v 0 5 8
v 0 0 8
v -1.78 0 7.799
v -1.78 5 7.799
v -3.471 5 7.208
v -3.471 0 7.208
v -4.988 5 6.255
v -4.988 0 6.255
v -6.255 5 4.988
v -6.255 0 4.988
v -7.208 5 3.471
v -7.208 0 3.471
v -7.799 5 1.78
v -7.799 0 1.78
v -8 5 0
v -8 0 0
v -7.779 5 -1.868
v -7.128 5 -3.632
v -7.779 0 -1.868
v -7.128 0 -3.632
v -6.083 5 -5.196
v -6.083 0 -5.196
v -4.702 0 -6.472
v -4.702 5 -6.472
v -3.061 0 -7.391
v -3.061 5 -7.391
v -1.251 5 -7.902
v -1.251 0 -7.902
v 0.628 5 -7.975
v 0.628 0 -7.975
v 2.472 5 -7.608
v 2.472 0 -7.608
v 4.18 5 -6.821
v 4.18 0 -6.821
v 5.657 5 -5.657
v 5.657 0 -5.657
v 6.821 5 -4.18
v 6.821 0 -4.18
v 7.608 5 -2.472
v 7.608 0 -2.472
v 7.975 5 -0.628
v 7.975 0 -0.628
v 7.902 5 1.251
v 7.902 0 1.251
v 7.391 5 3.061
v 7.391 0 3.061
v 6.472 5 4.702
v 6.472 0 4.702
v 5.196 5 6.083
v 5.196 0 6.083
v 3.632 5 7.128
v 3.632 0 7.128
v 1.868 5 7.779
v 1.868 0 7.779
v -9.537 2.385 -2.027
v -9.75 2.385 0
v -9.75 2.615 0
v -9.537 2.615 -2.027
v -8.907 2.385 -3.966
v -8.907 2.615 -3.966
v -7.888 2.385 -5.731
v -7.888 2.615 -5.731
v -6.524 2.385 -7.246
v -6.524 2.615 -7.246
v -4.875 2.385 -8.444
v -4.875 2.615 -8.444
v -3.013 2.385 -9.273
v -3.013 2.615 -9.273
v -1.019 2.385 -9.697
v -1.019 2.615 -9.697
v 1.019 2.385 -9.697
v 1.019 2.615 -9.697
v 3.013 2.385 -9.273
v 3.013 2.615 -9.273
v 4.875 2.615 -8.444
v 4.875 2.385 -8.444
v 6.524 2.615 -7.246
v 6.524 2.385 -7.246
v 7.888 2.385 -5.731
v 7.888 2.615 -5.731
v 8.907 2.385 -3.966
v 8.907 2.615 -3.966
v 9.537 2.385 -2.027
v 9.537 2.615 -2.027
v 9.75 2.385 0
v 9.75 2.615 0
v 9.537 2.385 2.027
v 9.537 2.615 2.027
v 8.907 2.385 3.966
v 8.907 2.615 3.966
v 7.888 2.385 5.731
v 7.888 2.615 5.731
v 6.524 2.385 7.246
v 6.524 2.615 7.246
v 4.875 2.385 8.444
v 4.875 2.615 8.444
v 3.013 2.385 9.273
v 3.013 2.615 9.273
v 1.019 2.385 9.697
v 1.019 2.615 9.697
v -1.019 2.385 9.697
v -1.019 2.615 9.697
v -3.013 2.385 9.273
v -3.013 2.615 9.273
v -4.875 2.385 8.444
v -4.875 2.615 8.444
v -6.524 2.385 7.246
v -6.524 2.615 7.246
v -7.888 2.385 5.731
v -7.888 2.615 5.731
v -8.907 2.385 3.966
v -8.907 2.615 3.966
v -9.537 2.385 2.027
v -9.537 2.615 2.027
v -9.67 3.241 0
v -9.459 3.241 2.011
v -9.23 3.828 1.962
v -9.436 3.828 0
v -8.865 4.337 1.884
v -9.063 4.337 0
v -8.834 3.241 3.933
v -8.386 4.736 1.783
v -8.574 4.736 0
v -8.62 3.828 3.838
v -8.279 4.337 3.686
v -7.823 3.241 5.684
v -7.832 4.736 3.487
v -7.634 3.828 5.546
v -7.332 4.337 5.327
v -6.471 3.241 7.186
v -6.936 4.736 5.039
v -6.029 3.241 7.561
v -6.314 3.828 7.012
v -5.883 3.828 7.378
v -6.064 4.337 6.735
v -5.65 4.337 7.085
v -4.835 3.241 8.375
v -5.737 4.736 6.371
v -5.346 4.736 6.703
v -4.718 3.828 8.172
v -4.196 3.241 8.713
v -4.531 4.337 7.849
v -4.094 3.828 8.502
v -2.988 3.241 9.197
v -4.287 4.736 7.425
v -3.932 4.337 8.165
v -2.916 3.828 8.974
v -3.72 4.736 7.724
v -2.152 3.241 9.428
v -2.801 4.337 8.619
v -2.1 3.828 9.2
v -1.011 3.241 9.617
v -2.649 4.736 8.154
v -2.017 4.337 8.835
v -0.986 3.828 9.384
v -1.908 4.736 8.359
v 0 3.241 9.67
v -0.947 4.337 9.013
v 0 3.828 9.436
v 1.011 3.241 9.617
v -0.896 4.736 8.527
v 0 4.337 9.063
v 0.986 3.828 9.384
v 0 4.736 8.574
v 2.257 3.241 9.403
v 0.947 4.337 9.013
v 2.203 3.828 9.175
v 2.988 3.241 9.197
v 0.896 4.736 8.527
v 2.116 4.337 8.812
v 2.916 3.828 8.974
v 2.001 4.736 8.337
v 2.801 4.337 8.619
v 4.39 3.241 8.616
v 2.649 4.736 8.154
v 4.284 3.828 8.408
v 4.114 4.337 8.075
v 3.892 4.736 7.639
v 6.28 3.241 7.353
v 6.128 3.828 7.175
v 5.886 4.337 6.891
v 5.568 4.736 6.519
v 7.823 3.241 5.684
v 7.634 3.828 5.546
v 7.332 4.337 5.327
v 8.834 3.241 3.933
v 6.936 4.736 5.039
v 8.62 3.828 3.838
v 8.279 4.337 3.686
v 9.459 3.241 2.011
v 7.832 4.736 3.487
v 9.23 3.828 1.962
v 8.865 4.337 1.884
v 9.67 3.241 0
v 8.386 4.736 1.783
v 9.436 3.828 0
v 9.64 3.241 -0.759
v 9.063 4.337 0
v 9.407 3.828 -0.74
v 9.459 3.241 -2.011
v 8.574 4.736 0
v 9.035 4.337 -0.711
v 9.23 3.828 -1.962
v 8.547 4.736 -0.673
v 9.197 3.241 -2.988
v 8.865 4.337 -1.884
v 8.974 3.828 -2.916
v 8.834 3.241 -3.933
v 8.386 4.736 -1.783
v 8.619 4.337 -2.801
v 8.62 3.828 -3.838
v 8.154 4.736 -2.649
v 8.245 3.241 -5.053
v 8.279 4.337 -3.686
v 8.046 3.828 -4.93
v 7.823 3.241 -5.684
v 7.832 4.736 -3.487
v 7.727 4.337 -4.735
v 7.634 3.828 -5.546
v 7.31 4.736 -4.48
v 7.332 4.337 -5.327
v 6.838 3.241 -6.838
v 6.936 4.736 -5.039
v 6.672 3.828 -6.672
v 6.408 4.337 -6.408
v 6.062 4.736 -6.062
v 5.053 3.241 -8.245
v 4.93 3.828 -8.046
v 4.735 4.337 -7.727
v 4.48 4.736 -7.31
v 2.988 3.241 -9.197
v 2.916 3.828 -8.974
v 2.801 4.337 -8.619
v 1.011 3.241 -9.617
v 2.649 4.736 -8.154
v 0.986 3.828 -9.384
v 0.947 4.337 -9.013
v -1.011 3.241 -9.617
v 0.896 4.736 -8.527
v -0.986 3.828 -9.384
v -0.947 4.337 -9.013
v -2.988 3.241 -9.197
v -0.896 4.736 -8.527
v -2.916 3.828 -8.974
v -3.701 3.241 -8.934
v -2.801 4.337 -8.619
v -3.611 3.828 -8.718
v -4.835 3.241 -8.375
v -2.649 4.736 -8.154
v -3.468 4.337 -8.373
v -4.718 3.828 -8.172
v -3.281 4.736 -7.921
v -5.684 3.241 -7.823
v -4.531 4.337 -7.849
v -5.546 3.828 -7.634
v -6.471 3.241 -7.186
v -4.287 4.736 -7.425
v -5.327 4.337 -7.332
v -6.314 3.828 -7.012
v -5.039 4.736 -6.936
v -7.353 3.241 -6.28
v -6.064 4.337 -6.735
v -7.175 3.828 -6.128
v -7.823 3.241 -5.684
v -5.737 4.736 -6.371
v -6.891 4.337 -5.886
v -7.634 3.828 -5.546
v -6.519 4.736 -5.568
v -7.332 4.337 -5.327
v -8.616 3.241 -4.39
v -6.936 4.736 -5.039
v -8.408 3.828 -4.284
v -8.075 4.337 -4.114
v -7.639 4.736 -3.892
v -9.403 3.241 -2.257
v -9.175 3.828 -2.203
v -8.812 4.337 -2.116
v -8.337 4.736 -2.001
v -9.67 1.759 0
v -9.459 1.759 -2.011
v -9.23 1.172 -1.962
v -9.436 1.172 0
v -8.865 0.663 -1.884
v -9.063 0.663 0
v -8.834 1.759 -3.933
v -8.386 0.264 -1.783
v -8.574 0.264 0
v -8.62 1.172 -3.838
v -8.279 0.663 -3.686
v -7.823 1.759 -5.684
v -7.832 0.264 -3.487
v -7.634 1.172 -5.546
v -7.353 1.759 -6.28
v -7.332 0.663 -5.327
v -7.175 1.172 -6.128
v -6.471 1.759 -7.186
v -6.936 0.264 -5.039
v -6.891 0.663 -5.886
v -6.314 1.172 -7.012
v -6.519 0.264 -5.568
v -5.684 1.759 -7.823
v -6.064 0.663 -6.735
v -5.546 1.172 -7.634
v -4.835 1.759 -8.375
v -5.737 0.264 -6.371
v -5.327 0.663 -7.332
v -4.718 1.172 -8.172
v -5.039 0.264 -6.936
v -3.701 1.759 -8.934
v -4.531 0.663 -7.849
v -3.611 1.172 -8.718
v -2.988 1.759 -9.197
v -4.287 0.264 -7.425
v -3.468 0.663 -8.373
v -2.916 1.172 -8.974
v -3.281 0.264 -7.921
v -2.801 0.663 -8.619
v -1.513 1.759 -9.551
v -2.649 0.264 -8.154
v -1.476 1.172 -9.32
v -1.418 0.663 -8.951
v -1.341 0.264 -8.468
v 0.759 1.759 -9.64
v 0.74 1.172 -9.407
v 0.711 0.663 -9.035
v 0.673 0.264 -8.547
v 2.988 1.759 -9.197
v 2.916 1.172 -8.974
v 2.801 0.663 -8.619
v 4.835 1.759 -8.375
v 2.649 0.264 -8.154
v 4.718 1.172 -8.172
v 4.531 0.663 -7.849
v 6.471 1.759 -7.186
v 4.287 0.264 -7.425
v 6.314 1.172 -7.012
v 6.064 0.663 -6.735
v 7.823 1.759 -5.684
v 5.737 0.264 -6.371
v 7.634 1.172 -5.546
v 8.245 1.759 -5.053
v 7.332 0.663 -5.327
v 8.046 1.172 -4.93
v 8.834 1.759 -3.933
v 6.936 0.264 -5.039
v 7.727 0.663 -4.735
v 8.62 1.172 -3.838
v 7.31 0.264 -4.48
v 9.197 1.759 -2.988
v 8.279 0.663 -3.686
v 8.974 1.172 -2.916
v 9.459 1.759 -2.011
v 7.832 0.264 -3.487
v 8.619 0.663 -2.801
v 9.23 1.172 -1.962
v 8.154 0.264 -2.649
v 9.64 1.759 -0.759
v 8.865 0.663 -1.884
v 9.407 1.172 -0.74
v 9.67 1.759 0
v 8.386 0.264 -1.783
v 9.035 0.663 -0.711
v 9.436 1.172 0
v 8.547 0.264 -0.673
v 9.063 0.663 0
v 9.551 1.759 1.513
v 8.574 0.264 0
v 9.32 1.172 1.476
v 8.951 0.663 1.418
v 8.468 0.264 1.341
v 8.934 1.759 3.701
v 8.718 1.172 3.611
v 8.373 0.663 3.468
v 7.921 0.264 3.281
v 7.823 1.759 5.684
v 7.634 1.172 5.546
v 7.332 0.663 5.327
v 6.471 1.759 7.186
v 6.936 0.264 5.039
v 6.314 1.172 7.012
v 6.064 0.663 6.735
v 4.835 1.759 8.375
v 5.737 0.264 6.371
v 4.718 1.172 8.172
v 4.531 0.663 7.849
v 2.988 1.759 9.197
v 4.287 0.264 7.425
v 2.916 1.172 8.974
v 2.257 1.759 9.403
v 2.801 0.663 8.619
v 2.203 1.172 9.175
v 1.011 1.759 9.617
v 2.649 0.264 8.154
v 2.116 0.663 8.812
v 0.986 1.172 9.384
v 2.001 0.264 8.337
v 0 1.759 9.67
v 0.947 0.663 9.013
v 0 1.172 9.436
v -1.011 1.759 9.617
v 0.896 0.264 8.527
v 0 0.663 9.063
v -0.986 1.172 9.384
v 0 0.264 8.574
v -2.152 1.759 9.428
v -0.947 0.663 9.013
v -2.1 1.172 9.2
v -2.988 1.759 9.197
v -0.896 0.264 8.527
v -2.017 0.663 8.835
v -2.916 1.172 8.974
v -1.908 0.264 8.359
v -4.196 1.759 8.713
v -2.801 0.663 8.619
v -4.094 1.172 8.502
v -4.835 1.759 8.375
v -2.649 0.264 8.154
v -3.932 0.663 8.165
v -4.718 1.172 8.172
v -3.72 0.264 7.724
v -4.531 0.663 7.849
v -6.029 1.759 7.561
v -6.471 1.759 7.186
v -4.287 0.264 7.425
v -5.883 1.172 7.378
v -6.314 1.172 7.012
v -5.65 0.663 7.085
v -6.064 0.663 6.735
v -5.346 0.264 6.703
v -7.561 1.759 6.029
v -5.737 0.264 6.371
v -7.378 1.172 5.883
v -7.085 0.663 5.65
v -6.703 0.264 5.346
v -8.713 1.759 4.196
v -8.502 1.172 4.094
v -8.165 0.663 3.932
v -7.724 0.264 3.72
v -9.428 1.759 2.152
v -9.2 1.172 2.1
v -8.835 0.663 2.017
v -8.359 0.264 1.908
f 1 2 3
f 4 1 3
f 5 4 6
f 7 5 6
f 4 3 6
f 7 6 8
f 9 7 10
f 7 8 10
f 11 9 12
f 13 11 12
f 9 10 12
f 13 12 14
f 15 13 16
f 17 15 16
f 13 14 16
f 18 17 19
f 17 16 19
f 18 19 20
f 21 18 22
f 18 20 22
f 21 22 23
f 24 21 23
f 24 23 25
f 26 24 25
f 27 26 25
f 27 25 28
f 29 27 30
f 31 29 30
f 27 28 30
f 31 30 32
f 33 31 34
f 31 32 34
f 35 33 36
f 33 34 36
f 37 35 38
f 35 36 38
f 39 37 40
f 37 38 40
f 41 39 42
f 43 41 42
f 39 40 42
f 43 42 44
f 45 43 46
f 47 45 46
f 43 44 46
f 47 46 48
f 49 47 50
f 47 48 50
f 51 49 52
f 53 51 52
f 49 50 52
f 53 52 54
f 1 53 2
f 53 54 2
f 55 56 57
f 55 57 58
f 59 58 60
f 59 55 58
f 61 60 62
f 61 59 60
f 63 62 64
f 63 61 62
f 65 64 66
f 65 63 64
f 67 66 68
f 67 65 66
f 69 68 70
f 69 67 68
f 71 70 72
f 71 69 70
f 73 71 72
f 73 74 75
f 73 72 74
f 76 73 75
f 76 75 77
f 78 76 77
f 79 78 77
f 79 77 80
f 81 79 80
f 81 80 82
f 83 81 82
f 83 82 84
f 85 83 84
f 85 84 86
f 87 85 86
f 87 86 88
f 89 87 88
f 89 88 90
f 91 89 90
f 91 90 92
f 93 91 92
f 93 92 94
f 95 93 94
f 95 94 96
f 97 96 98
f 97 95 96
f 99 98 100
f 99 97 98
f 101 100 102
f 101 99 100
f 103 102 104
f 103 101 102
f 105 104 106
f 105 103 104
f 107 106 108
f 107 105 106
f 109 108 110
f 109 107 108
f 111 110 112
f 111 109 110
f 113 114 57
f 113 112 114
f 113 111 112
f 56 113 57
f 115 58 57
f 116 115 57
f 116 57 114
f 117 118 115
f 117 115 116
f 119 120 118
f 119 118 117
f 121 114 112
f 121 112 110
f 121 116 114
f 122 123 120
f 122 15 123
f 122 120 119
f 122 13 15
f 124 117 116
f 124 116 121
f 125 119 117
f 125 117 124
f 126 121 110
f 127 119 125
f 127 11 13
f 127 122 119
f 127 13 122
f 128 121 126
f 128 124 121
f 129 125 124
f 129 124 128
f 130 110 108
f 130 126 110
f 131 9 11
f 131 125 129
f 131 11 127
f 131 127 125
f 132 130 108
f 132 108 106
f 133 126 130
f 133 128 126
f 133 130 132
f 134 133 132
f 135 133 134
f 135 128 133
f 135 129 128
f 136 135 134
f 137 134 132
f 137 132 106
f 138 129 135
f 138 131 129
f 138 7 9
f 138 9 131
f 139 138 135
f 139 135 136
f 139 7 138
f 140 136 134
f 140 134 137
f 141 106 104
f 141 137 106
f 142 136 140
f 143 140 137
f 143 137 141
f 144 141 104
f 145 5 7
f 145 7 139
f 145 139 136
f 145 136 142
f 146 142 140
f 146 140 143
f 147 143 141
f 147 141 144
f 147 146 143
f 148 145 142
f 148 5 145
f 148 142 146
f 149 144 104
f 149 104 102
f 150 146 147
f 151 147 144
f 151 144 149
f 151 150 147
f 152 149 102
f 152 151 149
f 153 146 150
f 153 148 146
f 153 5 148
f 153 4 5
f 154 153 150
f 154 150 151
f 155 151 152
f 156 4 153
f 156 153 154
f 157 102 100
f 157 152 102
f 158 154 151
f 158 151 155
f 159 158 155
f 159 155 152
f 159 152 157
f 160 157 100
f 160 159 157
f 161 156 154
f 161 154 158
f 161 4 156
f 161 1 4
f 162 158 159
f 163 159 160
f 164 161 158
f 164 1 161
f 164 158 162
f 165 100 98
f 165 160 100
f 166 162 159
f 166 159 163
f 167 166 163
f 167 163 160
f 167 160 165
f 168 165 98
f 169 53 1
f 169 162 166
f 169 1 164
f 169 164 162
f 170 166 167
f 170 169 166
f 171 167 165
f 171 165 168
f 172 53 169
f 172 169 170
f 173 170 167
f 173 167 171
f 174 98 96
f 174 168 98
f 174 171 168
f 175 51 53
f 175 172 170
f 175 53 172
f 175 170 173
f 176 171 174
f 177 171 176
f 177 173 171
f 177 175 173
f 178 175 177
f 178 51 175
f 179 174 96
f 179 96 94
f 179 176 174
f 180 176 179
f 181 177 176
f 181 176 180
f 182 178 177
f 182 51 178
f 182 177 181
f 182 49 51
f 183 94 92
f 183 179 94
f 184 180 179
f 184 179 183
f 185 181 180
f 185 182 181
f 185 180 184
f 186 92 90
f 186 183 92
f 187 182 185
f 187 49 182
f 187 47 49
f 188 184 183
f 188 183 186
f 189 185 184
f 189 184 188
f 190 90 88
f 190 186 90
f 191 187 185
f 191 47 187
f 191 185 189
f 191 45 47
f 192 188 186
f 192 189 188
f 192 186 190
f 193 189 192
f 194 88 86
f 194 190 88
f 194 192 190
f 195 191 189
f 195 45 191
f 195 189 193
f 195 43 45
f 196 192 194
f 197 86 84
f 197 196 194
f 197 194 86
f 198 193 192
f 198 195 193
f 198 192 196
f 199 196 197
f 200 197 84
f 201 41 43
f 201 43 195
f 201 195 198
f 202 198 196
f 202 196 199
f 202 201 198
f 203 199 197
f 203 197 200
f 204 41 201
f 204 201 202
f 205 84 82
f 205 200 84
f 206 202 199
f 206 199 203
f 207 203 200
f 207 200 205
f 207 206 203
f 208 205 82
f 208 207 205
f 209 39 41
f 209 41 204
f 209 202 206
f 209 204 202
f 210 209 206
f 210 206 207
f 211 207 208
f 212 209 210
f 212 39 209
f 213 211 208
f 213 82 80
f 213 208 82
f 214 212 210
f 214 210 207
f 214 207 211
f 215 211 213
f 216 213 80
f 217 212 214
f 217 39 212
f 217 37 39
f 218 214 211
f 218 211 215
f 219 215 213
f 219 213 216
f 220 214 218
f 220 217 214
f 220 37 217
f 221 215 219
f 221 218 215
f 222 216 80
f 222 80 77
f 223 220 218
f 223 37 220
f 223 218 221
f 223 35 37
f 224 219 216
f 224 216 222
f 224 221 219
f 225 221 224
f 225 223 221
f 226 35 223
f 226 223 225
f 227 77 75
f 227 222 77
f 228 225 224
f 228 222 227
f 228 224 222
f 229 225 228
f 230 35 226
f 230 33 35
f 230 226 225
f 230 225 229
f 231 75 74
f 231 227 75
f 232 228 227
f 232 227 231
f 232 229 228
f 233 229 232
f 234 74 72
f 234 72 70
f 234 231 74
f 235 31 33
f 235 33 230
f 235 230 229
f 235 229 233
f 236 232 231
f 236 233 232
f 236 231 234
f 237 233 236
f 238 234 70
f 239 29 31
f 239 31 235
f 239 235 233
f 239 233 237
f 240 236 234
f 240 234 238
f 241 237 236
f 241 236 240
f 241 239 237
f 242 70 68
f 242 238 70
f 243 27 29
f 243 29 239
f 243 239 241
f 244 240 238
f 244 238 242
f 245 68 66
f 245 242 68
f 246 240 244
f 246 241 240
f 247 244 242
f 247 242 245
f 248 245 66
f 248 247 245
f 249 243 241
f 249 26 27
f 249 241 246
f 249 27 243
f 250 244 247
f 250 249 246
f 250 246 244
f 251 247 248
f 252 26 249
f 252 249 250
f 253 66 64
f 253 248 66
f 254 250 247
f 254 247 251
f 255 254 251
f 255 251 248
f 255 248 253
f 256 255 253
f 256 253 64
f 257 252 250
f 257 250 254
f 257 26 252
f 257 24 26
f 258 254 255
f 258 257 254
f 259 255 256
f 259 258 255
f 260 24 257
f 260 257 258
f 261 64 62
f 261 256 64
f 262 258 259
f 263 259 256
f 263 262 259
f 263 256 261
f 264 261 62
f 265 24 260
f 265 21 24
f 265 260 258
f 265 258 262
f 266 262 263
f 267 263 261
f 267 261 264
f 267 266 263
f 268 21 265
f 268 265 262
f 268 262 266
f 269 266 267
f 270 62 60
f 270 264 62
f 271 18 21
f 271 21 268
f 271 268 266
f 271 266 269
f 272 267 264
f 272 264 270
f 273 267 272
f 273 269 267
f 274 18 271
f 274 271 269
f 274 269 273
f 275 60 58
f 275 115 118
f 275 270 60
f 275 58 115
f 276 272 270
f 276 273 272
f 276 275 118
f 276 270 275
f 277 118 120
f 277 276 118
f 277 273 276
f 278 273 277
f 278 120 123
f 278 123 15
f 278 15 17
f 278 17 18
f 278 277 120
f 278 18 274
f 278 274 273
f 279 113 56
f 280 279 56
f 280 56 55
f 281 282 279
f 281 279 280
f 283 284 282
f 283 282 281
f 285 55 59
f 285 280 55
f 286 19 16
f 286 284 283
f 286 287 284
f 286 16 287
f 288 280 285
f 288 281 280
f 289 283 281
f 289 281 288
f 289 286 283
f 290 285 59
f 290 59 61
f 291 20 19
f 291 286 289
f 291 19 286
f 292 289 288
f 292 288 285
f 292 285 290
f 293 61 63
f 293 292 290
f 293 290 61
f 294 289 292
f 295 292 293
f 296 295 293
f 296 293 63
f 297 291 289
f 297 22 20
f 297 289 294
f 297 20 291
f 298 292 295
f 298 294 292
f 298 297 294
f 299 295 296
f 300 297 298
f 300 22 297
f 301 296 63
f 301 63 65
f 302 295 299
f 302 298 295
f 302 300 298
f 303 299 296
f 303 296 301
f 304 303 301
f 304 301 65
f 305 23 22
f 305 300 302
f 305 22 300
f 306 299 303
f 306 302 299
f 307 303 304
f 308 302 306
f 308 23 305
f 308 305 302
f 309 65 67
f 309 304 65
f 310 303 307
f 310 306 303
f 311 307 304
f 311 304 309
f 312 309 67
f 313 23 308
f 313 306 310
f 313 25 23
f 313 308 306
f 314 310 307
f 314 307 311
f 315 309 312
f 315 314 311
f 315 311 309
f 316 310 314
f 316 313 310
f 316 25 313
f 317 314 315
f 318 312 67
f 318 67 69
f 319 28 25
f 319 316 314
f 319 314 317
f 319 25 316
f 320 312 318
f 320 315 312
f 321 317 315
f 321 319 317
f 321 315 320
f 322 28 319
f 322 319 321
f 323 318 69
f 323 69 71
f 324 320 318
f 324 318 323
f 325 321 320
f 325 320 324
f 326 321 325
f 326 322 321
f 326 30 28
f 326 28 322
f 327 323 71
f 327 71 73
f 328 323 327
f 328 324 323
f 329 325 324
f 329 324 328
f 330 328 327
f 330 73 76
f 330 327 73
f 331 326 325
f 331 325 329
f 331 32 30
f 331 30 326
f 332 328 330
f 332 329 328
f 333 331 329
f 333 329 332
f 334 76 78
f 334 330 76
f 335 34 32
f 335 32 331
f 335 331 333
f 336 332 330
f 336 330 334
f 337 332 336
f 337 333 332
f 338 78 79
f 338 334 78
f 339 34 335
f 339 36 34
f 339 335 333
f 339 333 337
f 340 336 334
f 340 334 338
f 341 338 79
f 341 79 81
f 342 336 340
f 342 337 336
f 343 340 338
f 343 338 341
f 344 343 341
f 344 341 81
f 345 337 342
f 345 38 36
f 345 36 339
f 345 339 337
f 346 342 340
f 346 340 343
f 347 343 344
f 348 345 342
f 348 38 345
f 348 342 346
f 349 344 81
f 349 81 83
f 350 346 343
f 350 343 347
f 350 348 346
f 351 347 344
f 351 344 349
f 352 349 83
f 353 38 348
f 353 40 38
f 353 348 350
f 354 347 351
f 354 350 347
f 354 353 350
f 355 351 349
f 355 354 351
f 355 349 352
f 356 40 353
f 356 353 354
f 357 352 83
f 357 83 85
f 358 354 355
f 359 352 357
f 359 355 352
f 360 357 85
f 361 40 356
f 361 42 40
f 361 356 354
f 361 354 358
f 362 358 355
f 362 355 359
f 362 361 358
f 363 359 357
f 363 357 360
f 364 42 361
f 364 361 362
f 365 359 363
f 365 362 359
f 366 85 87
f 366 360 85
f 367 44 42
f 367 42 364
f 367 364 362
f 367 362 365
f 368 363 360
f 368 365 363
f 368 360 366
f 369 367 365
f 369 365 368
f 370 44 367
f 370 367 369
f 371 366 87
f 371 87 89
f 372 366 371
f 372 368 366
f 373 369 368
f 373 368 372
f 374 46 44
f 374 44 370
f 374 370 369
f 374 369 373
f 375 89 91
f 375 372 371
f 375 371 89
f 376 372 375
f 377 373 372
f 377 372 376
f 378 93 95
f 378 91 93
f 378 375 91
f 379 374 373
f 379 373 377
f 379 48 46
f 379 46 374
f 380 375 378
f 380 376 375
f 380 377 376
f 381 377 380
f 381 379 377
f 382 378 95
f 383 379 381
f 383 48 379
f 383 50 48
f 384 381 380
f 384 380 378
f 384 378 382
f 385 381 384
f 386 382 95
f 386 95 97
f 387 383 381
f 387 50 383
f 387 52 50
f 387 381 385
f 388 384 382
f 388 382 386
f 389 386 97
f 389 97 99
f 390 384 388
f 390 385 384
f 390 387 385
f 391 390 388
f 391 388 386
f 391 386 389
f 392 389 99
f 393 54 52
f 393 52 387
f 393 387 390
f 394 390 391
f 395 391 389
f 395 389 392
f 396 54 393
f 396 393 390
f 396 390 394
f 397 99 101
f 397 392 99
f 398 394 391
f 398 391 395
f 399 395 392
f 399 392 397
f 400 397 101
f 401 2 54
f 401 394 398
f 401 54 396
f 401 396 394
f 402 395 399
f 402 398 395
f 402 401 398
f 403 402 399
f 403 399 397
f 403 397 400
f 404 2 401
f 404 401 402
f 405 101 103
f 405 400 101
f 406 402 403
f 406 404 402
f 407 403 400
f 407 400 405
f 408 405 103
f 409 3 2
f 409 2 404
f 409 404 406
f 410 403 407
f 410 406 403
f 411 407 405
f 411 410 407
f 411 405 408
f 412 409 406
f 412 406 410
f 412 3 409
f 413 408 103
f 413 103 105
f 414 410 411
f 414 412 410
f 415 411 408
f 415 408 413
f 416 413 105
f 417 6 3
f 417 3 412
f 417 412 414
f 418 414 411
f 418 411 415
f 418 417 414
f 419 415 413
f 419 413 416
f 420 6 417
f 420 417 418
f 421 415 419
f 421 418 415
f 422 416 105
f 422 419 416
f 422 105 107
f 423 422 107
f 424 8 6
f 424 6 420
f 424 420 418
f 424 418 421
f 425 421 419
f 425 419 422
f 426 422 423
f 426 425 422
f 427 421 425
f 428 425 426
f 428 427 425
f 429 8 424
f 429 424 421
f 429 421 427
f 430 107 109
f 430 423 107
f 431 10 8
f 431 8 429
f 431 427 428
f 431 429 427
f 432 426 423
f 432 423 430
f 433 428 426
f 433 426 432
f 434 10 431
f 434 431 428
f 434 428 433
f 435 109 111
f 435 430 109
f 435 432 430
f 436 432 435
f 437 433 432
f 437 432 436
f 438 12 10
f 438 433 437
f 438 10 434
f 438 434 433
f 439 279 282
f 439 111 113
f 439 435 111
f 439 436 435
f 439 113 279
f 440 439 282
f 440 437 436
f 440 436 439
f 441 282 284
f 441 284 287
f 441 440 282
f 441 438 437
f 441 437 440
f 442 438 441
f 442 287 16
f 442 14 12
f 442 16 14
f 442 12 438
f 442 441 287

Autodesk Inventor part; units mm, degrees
ref_plane "YZ Plane" through (0, 0, 0) normal (1, 0, 0) x (0, 1, 0)
ref_plane "XZ Plane" through (0, 0, 0) normal (0, 1, 0) x (-1, 0, 0)
ref_plane "XY Plane" through (0, 0, 0) normal (0, 0, 1) x (1, 0, 0)
sketch "Boceto1" plane through (0, 0, 0) normal (0, 1, 0) x (-1, 0, 0)
  circle A0 centre (0, 0) radius 9.75
  dimension "d0" = 19.5
extrude "Extrusión1" add sketch "Boceto1" along normal blind 5
sketch "Boceto3" plane through (0, 5, 0) normal (0, 1, 0) x (1, 0, 0)
  circle A0 centre (0, 0) radius 9.75 projected
hole "Agujero2" at (0, 5, 0) direction (0, -1, 0) diameter 16 depth 5 tip angle 118
fillet "Empalme3" radius 2.5 2 edges at (9.75, 5, 0) (9.75, 0, 0)
properties part number "exterior"
